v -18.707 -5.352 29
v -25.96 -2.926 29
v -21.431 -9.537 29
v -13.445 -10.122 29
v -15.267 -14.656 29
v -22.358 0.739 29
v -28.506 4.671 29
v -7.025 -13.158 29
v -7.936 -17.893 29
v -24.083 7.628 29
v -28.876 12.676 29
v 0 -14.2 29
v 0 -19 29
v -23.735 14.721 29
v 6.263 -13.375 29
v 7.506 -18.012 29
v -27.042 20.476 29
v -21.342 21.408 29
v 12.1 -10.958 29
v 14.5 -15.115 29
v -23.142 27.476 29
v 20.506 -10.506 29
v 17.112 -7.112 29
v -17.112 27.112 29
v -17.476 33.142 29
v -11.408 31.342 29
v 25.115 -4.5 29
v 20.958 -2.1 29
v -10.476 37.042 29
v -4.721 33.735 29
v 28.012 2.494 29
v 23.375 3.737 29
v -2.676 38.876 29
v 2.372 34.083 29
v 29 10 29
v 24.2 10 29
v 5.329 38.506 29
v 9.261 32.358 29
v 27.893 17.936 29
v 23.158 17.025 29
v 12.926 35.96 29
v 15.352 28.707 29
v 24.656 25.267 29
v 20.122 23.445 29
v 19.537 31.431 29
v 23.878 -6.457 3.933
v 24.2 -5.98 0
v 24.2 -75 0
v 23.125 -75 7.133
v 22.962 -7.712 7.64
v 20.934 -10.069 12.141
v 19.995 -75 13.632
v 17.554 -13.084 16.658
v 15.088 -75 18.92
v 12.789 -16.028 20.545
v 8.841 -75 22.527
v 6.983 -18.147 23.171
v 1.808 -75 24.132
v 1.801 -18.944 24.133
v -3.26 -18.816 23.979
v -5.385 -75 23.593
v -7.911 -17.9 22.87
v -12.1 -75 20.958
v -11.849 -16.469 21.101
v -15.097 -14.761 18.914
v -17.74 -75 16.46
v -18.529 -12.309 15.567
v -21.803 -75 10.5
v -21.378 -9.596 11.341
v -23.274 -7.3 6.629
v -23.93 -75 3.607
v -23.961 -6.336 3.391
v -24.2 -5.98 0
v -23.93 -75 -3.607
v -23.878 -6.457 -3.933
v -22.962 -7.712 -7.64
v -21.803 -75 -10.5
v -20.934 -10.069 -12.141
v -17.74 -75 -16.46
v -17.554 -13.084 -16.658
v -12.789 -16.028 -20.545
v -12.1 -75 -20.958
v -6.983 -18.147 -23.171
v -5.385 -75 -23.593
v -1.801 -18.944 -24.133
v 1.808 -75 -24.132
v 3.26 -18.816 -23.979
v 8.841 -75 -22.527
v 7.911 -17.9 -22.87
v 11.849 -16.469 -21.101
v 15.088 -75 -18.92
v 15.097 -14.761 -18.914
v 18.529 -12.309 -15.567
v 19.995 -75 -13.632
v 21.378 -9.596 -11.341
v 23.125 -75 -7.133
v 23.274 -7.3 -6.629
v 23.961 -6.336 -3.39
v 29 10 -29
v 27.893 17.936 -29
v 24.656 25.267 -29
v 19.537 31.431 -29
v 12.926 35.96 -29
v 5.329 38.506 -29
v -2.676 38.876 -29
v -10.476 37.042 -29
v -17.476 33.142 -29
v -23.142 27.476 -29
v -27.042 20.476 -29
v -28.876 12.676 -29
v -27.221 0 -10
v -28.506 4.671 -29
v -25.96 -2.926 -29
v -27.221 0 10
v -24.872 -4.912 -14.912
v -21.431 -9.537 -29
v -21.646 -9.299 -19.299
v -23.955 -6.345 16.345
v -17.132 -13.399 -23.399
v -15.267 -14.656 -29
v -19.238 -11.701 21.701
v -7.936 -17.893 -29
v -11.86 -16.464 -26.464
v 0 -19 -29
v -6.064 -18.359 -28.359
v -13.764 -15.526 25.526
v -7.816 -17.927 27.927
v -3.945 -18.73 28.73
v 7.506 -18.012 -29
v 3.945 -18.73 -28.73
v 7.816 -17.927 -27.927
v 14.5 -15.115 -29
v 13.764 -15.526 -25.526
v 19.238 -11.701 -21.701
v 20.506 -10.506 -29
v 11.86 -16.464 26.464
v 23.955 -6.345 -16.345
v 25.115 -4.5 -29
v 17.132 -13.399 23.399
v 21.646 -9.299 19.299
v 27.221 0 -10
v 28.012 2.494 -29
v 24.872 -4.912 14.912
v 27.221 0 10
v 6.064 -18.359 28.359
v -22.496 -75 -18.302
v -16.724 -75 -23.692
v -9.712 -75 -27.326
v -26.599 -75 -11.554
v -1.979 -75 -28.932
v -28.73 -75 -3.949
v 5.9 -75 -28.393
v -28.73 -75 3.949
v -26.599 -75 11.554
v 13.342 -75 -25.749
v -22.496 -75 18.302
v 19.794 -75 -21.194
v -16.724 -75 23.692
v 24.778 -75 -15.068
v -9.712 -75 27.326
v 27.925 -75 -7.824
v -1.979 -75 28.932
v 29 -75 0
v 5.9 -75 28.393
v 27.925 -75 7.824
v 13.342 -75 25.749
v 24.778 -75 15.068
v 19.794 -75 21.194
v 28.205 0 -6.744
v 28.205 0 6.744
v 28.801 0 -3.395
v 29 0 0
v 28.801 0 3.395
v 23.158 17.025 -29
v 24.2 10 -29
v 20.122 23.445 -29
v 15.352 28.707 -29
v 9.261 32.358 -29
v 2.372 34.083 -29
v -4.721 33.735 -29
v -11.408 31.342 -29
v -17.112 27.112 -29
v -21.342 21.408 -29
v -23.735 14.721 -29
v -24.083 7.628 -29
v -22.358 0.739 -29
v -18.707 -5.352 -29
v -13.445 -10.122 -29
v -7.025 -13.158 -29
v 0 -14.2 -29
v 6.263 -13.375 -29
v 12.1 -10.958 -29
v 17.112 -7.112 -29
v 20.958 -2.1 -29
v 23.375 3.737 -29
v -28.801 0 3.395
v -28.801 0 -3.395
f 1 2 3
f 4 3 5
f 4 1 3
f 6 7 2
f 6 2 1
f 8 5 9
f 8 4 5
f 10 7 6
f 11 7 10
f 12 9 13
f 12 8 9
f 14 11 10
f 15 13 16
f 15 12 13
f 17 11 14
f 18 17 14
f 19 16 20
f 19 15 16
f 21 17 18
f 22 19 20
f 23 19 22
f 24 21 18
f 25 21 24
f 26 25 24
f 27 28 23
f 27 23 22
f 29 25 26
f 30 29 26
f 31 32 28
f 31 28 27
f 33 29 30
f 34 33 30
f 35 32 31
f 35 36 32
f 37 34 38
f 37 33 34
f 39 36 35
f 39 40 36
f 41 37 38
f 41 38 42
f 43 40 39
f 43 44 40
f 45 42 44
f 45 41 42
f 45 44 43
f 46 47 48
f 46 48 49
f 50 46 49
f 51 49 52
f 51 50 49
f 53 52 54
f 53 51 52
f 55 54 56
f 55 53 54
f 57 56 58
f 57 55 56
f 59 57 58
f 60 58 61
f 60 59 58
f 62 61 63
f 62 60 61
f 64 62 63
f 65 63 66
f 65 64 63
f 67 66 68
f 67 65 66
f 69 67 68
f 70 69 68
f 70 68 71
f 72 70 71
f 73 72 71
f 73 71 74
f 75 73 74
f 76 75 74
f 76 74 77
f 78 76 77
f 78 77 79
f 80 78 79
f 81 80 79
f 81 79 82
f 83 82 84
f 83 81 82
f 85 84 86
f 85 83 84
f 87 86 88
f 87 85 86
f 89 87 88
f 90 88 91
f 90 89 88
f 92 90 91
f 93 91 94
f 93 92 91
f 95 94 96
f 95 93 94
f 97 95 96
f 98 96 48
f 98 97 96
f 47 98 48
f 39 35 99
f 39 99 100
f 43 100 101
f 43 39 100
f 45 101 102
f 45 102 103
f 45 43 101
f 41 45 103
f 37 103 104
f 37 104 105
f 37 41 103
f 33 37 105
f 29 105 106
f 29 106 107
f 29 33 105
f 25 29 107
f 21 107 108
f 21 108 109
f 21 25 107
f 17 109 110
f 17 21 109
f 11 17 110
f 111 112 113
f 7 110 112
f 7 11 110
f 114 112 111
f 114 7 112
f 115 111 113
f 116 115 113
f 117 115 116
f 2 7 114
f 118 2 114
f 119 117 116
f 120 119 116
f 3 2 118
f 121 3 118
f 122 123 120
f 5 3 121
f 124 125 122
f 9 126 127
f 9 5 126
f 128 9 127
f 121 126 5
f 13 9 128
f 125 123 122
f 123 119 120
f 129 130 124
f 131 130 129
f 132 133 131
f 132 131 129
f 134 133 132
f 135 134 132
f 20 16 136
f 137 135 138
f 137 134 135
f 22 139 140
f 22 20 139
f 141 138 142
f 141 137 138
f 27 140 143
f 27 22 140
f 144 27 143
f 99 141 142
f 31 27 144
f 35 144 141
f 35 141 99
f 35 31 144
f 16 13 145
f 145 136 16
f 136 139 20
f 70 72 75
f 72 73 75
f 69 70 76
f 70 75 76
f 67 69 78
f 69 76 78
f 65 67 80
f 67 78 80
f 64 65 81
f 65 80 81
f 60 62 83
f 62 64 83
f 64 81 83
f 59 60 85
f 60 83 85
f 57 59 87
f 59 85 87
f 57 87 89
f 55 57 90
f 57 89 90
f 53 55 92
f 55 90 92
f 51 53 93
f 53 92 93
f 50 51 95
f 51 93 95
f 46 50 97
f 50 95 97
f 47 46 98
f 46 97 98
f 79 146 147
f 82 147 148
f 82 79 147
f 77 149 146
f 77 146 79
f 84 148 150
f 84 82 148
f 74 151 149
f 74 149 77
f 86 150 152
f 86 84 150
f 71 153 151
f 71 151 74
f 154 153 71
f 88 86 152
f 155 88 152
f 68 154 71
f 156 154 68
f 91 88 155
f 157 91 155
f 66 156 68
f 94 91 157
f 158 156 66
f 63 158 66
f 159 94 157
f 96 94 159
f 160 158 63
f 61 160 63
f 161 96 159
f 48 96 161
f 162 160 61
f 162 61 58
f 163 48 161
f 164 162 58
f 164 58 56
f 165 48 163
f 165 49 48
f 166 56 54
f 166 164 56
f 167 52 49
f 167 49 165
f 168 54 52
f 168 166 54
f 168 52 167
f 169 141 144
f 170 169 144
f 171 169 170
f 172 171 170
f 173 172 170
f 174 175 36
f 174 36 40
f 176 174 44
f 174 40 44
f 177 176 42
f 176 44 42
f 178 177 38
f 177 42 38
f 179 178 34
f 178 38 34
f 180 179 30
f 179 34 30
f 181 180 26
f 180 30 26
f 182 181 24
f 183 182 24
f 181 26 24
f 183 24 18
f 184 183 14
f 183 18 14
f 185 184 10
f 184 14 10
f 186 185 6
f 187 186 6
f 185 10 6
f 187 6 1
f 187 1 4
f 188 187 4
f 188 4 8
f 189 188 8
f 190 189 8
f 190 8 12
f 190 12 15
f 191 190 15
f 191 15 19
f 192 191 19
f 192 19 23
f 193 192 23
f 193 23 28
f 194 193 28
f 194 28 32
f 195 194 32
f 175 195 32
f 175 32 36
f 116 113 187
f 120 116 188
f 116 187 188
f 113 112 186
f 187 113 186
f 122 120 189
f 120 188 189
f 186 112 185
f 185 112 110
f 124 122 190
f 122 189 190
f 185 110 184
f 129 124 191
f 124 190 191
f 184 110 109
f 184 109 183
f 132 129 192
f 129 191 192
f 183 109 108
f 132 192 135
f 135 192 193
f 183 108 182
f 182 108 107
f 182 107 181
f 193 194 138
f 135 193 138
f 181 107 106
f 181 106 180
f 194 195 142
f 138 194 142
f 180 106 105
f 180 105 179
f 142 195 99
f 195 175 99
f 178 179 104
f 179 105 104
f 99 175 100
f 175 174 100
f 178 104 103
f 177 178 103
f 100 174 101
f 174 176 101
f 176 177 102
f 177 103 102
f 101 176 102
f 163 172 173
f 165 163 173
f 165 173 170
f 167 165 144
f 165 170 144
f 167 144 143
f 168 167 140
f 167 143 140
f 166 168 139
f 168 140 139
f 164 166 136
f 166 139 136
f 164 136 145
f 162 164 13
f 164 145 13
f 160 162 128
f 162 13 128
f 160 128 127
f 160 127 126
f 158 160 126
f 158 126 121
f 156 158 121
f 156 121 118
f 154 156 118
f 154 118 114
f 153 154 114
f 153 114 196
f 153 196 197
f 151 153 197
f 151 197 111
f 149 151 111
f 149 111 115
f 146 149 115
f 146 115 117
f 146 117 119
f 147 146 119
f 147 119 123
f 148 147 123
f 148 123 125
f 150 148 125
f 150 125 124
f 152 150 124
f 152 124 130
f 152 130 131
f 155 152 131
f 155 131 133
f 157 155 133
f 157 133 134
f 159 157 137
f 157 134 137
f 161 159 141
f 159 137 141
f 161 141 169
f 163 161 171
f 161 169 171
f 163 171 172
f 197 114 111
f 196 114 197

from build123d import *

# Parameters (mm, degrees)
F0_R          = 29
F0_R_2        = 24.2
F1_DEPTH      = 75
F2_R          = 29
F2_R_2        = 24.2
F3_DEPTH      = 29
F3_DEPTH_BACK = 29
F4_R          = 24.2
F5_DEPTH      = 58.001


with BuildPart() as f1:
    # F0 (on Front) → F1 (new body)
    with BuildSketch(Plane.XZ):
        Circle(F0_R)
        Circle(F0_R_2, mode=Mode.SUBTRACT)
    extrude(amount=F1_DEPTH)

    # F2 (on Top) → F3 (join, two sides)
    with BuildSketch(Plane.XY) as f3_sk:
        with Locations((0, 10)):
            Circle(F2_R)
        with Locations((0, 10)):
            Circle(F2_R_2, mode=Mode.SUBTRACT)
    extrude(amount=F3_DEPTH)
    extrude(f3_sk.sketch, amount=-F3_DEPTH_BACK)

    # F4 (on face) → F5 (cut, through all)
    with BuildSketch(Plane.XY.offset(29)):
        with Locations((0, 10)):
            Circle(F4_R)
    extrude(amount=-F5_DEPTH, mode=Mode.SUBTRACT)


solid = f1.part
